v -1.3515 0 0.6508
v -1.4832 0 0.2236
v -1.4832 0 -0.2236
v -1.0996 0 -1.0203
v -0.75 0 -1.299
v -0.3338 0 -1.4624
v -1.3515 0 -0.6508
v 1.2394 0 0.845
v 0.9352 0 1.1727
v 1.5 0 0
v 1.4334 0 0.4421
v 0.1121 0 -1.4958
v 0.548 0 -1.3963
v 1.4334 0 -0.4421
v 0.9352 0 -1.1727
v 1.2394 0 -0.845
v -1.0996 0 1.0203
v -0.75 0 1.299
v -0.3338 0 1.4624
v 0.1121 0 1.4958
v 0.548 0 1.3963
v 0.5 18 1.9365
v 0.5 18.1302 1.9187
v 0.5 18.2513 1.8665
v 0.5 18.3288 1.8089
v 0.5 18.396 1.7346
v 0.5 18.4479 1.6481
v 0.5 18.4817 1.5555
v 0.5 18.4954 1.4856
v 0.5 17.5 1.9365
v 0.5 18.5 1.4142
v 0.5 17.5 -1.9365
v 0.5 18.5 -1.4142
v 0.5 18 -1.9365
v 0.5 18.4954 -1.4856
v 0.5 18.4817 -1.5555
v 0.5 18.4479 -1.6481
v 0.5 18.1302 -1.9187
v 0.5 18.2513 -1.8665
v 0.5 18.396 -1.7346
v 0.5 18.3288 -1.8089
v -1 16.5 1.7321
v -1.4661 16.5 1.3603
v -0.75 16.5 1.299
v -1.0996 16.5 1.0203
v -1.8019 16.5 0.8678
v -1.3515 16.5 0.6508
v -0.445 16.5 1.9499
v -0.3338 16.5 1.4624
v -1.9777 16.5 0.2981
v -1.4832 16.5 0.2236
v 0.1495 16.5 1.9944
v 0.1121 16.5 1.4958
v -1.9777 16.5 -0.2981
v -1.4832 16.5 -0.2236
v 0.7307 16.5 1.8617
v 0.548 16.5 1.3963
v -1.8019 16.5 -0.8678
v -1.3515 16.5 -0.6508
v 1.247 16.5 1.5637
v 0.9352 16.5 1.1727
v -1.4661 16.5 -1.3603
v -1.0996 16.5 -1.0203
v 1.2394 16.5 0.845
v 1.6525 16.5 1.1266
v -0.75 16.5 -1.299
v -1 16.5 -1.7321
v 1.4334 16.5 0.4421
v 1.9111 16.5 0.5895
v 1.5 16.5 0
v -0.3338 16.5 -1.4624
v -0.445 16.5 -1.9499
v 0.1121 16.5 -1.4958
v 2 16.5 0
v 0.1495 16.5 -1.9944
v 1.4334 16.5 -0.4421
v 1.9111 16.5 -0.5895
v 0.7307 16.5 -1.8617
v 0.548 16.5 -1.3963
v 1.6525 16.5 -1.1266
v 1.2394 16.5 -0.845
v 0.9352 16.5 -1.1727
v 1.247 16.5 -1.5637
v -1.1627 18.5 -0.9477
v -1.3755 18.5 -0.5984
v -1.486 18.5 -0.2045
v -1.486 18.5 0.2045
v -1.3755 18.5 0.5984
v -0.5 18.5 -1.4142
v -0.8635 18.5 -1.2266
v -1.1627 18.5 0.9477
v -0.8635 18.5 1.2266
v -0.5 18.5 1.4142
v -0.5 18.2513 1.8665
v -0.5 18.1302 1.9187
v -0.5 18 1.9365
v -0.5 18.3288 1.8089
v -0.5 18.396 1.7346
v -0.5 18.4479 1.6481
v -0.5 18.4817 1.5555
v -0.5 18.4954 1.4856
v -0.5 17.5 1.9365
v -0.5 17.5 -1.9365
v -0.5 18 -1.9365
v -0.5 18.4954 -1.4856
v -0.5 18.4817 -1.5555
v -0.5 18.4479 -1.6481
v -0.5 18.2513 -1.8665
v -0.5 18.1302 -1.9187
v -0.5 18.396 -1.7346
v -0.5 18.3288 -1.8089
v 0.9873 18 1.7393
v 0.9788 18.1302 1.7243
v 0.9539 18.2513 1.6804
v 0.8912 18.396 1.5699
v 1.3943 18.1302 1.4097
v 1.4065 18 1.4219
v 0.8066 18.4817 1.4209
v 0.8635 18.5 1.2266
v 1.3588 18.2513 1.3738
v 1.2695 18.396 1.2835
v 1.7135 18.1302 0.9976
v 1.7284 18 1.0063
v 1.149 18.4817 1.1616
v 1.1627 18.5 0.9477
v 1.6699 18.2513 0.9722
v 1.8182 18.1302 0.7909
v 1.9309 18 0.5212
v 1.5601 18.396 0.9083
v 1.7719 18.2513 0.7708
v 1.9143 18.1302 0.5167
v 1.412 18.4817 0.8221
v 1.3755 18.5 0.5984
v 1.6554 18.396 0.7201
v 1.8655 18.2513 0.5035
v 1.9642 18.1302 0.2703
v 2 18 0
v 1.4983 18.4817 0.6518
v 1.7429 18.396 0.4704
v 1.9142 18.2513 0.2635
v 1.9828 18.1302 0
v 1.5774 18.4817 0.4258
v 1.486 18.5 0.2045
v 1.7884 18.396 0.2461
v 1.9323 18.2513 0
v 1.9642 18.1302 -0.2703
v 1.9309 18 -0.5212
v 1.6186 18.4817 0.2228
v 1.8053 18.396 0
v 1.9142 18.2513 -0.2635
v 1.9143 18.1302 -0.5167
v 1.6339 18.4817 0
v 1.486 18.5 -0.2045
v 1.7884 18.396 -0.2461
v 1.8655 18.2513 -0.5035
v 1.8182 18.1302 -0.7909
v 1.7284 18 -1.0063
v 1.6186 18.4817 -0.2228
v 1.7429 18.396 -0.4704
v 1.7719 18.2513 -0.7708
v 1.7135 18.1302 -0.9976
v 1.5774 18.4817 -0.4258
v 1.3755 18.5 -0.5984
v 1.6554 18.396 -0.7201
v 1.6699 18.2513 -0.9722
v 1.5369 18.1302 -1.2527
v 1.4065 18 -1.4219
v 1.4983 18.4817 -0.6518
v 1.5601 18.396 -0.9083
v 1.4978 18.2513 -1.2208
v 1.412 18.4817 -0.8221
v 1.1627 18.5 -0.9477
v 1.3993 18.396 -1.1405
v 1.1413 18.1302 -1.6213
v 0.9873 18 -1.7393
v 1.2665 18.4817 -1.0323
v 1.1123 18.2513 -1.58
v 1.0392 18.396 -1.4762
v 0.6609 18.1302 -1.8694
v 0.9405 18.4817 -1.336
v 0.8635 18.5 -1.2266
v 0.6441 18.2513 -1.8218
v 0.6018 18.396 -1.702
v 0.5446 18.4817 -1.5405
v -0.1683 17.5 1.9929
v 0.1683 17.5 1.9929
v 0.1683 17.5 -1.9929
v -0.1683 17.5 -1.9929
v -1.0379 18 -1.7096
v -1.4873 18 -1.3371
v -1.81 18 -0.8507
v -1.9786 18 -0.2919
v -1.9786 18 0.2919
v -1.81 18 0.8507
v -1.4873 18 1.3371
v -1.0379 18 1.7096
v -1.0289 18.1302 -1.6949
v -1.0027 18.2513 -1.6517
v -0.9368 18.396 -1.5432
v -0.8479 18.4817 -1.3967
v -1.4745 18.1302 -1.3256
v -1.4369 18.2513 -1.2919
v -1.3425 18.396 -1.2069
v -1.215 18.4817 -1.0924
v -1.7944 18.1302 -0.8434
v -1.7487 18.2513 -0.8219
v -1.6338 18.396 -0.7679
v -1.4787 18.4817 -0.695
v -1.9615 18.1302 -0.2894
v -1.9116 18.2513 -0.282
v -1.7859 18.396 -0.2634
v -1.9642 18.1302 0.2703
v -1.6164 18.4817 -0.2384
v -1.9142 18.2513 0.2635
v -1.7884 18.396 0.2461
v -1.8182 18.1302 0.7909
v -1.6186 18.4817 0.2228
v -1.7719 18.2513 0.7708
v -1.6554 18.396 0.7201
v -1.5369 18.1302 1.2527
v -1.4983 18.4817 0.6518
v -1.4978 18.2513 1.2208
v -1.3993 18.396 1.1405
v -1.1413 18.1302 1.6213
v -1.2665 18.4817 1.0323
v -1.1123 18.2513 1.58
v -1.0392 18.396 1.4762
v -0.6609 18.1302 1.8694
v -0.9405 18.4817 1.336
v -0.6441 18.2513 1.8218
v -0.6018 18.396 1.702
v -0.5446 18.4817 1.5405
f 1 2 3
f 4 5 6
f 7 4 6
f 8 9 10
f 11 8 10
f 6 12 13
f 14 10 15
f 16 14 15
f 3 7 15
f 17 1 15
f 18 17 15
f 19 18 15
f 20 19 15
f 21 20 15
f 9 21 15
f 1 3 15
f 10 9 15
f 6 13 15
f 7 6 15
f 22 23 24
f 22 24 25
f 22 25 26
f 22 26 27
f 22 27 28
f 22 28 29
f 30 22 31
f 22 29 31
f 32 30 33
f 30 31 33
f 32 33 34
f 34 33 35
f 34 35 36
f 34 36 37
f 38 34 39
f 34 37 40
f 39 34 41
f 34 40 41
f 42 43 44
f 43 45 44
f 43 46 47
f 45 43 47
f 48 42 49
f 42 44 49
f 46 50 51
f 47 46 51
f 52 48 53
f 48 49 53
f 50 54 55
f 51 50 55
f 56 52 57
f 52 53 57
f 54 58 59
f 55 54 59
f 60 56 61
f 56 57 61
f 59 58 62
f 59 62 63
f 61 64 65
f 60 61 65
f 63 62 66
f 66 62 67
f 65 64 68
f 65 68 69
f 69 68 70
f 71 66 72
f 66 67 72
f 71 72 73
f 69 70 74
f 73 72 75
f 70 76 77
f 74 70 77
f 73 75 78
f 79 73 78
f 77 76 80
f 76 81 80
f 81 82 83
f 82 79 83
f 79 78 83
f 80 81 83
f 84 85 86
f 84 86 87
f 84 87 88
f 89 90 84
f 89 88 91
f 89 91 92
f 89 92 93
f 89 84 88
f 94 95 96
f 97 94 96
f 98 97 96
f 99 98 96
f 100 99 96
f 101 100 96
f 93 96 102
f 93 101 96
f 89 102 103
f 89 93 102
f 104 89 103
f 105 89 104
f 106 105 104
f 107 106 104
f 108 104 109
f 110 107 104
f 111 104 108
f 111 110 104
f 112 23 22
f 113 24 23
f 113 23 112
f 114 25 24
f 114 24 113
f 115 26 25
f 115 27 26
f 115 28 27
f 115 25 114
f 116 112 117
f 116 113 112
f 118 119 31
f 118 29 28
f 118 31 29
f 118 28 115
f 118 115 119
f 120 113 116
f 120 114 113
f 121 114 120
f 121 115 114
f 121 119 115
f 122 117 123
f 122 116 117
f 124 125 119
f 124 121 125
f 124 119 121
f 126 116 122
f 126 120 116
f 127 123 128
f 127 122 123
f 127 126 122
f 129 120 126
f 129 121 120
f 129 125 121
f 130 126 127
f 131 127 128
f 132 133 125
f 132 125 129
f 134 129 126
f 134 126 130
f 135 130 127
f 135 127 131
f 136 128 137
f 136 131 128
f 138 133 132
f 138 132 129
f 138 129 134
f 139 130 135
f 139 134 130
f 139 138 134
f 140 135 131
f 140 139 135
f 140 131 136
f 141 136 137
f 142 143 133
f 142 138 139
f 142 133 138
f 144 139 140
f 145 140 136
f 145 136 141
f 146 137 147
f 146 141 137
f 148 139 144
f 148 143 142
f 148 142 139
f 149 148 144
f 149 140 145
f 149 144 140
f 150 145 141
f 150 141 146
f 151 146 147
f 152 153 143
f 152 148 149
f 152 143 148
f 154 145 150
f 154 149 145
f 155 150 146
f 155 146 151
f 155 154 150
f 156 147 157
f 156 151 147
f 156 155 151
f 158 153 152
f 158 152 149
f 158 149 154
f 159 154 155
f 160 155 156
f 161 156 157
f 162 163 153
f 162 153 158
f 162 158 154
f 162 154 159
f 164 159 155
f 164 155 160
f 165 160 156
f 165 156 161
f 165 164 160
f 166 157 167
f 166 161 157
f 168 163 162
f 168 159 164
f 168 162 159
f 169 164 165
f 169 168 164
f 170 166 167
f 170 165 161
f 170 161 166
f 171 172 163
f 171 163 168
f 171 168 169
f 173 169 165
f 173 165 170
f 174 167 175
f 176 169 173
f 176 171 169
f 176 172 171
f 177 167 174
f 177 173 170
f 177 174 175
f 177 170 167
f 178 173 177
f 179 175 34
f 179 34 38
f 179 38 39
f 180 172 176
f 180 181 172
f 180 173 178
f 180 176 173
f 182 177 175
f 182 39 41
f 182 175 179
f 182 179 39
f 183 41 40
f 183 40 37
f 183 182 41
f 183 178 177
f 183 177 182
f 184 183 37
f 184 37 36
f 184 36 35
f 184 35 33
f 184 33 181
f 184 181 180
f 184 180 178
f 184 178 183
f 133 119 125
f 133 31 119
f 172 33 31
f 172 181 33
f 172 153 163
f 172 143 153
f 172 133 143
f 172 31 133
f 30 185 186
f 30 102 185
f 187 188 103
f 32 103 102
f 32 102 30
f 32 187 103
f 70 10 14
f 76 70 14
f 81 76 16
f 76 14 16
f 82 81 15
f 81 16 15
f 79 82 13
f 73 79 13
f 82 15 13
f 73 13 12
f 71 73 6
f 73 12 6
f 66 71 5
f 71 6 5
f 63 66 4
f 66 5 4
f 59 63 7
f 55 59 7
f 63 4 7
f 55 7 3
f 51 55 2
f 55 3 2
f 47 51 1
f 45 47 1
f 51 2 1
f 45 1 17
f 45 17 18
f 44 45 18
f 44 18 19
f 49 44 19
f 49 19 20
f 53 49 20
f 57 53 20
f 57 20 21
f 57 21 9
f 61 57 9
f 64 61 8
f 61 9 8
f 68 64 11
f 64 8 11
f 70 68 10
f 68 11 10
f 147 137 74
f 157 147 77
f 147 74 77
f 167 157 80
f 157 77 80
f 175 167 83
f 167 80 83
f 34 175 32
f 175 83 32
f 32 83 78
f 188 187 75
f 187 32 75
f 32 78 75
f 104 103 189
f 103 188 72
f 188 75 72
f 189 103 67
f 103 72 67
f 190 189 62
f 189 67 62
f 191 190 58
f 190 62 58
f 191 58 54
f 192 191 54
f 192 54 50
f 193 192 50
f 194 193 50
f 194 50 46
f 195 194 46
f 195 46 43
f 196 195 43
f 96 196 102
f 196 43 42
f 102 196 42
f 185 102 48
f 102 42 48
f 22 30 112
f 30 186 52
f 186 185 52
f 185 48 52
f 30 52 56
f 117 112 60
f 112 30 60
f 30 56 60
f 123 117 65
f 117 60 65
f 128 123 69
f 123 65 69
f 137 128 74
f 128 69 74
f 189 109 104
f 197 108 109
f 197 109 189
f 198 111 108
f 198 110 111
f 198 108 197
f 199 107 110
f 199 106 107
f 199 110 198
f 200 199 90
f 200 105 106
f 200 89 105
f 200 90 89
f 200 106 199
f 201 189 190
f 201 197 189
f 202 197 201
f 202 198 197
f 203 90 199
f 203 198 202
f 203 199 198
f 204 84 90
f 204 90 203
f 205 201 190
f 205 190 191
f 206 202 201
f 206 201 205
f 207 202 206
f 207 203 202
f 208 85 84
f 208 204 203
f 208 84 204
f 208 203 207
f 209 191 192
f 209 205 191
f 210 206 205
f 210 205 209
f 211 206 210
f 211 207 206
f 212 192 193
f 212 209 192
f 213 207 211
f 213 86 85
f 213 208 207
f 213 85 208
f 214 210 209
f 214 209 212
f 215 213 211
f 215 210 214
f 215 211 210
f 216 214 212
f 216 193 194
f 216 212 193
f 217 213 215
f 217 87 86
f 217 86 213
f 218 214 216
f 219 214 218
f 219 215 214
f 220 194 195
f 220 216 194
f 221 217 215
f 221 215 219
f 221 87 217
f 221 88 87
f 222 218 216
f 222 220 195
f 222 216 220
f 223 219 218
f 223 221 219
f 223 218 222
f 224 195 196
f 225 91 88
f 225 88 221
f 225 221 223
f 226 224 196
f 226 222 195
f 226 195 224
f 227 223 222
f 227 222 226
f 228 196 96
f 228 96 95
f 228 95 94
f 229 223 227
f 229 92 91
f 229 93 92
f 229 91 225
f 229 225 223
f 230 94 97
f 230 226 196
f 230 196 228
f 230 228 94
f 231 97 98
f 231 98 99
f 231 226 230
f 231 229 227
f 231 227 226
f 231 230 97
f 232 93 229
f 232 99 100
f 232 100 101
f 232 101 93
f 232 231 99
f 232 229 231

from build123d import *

# Parameters (mm, degrees)
ESQUISSE1_R             = 1.5
BOSS_EXTRU_1_DEPTH      = 16.5
ESQUISSE2_R             = 2
BOSS_EXTRU_2_DEPTH      = 2
ESQUISSE3_W             = 1
ESQUISSE3_H             = 4
ENL_V_MAT_EXTRU_1_DEPTH = 1
CONG_1_R                = 0.5


with BuildPart() as part:
    # Esquisse1 → Boss.-Extru.1 (new body)
    with BuildSketch(Plane(origin=(0, 0, 0), x_dir=(1, 0, 0), z_dir=(0, 1, 0))):
        Circle(ESQUISSE1_R)
    extrude(amount=BOSS_EXTRU_1_DEPTH)

    # Esquisse2 → Boss.-Extru.2 (add)
    with BuildSketch(Plane(origin=(0, 16.5, 0), x_dir=(1, 0, 0), z_dir=(0, 1, 0))):
        Circle(ESQUISSE2_R)
    extrude(amount=BOSS_EXTRU_2_DEPTH)

    # Esquisse3 → Enlèv. mat.-Extru.1 (cut)
    with BuildSketch(Plane(origin=(0, 18.5, 0), x_dir=(1, 0, 0), z_dir=(0, 1, 0))):
        Rectangle(ESQUISSE3_W, ESQUISSE3_H)
    extrude(amount=-ENL_V_MAT_EXTRU_1_DEPTH, mode=Mode.SUBTRACT)

    # Congé1
    cong_1_edges = [part.edges().sort_by_distance(p)[0] for p in [
        (1.58113883, 18.5, -1.224744871),
        (-2, 18.5, 0),
    ]]
    fillet(cong_1_edges, radius=CONG_1_R)


solid = part.part
